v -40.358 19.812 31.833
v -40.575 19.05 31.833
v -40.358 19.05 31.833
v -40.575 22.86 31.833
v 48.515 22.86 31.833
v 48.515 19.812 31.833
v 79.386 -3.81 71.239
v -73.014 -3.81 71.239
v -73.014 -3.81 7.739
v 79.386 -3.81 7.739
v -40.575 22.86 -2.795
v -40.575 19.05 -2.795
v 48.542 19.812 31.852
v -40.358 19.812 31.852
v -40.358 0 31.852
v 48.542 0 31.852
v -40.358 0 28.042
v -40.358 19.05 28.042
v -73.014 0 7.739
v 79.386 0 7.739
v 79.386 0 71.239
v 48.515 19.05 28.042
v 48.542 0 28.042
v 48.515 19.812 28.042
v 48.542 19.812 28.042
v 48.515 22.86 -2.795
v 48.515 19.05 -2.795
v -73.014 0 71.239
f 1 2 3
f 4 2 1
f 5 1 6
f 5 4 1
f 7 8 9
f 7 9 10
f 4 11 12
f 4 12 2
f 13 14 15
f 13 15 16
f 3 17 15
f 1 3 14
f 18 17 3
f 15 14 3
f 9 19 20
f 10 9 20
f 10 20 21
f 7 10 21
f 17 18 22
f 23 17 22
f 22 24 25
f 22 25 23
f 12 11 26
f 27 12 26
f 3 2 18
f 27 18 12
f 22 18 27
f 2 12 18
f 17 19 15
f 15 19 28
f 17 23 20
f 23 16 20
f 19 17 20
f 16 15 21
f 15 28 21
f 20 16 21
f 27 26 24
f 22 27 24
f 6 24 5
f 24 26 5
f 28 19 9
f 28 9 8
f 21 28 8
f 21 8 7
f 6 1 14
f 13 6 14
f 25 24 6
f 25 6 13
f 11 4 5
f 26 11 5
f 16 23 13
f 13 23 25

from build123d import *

# Parameters (mm, degrees)
F0_W     = 152.4
F0_H     = 63.5
F1_DEPTH = 3.81
F3_W     = 88.9
F3_H     = 19.812
F4_DEPTH = 3.81
F6_W     = 89.090503
F6_H     = 34.628688
F7_DEPTH = 3.81


with BuildPart() as f1:
    # F0 (on Front) → F1 (new body)
    with BuildSketch(Plane.XZ):
        with Locations((3.185697, 39.488637)):
            Rectangle(F0_W, F0_H)
    extrude(amount=F1_DEPTH)

    # F3 (on offset) → F4 (join)
    with BuildSketch(Plane.XY.offset(28.0416)):
        with Locations((4.091607, 9.906)):
            Rectangle(F3_W, F3_H)
    extrude(amount=F4_DEPTH)

    # F6 (on offset) → F7 (join)
    with BuildSketch(Plane.XZ.offset(-22.86)):
        with Locations((3.969803, 14.518858)):
            Rectangle(F6_W, F6_H)
    extrude(amount=F7_DEPTH)


solid = f1.part
